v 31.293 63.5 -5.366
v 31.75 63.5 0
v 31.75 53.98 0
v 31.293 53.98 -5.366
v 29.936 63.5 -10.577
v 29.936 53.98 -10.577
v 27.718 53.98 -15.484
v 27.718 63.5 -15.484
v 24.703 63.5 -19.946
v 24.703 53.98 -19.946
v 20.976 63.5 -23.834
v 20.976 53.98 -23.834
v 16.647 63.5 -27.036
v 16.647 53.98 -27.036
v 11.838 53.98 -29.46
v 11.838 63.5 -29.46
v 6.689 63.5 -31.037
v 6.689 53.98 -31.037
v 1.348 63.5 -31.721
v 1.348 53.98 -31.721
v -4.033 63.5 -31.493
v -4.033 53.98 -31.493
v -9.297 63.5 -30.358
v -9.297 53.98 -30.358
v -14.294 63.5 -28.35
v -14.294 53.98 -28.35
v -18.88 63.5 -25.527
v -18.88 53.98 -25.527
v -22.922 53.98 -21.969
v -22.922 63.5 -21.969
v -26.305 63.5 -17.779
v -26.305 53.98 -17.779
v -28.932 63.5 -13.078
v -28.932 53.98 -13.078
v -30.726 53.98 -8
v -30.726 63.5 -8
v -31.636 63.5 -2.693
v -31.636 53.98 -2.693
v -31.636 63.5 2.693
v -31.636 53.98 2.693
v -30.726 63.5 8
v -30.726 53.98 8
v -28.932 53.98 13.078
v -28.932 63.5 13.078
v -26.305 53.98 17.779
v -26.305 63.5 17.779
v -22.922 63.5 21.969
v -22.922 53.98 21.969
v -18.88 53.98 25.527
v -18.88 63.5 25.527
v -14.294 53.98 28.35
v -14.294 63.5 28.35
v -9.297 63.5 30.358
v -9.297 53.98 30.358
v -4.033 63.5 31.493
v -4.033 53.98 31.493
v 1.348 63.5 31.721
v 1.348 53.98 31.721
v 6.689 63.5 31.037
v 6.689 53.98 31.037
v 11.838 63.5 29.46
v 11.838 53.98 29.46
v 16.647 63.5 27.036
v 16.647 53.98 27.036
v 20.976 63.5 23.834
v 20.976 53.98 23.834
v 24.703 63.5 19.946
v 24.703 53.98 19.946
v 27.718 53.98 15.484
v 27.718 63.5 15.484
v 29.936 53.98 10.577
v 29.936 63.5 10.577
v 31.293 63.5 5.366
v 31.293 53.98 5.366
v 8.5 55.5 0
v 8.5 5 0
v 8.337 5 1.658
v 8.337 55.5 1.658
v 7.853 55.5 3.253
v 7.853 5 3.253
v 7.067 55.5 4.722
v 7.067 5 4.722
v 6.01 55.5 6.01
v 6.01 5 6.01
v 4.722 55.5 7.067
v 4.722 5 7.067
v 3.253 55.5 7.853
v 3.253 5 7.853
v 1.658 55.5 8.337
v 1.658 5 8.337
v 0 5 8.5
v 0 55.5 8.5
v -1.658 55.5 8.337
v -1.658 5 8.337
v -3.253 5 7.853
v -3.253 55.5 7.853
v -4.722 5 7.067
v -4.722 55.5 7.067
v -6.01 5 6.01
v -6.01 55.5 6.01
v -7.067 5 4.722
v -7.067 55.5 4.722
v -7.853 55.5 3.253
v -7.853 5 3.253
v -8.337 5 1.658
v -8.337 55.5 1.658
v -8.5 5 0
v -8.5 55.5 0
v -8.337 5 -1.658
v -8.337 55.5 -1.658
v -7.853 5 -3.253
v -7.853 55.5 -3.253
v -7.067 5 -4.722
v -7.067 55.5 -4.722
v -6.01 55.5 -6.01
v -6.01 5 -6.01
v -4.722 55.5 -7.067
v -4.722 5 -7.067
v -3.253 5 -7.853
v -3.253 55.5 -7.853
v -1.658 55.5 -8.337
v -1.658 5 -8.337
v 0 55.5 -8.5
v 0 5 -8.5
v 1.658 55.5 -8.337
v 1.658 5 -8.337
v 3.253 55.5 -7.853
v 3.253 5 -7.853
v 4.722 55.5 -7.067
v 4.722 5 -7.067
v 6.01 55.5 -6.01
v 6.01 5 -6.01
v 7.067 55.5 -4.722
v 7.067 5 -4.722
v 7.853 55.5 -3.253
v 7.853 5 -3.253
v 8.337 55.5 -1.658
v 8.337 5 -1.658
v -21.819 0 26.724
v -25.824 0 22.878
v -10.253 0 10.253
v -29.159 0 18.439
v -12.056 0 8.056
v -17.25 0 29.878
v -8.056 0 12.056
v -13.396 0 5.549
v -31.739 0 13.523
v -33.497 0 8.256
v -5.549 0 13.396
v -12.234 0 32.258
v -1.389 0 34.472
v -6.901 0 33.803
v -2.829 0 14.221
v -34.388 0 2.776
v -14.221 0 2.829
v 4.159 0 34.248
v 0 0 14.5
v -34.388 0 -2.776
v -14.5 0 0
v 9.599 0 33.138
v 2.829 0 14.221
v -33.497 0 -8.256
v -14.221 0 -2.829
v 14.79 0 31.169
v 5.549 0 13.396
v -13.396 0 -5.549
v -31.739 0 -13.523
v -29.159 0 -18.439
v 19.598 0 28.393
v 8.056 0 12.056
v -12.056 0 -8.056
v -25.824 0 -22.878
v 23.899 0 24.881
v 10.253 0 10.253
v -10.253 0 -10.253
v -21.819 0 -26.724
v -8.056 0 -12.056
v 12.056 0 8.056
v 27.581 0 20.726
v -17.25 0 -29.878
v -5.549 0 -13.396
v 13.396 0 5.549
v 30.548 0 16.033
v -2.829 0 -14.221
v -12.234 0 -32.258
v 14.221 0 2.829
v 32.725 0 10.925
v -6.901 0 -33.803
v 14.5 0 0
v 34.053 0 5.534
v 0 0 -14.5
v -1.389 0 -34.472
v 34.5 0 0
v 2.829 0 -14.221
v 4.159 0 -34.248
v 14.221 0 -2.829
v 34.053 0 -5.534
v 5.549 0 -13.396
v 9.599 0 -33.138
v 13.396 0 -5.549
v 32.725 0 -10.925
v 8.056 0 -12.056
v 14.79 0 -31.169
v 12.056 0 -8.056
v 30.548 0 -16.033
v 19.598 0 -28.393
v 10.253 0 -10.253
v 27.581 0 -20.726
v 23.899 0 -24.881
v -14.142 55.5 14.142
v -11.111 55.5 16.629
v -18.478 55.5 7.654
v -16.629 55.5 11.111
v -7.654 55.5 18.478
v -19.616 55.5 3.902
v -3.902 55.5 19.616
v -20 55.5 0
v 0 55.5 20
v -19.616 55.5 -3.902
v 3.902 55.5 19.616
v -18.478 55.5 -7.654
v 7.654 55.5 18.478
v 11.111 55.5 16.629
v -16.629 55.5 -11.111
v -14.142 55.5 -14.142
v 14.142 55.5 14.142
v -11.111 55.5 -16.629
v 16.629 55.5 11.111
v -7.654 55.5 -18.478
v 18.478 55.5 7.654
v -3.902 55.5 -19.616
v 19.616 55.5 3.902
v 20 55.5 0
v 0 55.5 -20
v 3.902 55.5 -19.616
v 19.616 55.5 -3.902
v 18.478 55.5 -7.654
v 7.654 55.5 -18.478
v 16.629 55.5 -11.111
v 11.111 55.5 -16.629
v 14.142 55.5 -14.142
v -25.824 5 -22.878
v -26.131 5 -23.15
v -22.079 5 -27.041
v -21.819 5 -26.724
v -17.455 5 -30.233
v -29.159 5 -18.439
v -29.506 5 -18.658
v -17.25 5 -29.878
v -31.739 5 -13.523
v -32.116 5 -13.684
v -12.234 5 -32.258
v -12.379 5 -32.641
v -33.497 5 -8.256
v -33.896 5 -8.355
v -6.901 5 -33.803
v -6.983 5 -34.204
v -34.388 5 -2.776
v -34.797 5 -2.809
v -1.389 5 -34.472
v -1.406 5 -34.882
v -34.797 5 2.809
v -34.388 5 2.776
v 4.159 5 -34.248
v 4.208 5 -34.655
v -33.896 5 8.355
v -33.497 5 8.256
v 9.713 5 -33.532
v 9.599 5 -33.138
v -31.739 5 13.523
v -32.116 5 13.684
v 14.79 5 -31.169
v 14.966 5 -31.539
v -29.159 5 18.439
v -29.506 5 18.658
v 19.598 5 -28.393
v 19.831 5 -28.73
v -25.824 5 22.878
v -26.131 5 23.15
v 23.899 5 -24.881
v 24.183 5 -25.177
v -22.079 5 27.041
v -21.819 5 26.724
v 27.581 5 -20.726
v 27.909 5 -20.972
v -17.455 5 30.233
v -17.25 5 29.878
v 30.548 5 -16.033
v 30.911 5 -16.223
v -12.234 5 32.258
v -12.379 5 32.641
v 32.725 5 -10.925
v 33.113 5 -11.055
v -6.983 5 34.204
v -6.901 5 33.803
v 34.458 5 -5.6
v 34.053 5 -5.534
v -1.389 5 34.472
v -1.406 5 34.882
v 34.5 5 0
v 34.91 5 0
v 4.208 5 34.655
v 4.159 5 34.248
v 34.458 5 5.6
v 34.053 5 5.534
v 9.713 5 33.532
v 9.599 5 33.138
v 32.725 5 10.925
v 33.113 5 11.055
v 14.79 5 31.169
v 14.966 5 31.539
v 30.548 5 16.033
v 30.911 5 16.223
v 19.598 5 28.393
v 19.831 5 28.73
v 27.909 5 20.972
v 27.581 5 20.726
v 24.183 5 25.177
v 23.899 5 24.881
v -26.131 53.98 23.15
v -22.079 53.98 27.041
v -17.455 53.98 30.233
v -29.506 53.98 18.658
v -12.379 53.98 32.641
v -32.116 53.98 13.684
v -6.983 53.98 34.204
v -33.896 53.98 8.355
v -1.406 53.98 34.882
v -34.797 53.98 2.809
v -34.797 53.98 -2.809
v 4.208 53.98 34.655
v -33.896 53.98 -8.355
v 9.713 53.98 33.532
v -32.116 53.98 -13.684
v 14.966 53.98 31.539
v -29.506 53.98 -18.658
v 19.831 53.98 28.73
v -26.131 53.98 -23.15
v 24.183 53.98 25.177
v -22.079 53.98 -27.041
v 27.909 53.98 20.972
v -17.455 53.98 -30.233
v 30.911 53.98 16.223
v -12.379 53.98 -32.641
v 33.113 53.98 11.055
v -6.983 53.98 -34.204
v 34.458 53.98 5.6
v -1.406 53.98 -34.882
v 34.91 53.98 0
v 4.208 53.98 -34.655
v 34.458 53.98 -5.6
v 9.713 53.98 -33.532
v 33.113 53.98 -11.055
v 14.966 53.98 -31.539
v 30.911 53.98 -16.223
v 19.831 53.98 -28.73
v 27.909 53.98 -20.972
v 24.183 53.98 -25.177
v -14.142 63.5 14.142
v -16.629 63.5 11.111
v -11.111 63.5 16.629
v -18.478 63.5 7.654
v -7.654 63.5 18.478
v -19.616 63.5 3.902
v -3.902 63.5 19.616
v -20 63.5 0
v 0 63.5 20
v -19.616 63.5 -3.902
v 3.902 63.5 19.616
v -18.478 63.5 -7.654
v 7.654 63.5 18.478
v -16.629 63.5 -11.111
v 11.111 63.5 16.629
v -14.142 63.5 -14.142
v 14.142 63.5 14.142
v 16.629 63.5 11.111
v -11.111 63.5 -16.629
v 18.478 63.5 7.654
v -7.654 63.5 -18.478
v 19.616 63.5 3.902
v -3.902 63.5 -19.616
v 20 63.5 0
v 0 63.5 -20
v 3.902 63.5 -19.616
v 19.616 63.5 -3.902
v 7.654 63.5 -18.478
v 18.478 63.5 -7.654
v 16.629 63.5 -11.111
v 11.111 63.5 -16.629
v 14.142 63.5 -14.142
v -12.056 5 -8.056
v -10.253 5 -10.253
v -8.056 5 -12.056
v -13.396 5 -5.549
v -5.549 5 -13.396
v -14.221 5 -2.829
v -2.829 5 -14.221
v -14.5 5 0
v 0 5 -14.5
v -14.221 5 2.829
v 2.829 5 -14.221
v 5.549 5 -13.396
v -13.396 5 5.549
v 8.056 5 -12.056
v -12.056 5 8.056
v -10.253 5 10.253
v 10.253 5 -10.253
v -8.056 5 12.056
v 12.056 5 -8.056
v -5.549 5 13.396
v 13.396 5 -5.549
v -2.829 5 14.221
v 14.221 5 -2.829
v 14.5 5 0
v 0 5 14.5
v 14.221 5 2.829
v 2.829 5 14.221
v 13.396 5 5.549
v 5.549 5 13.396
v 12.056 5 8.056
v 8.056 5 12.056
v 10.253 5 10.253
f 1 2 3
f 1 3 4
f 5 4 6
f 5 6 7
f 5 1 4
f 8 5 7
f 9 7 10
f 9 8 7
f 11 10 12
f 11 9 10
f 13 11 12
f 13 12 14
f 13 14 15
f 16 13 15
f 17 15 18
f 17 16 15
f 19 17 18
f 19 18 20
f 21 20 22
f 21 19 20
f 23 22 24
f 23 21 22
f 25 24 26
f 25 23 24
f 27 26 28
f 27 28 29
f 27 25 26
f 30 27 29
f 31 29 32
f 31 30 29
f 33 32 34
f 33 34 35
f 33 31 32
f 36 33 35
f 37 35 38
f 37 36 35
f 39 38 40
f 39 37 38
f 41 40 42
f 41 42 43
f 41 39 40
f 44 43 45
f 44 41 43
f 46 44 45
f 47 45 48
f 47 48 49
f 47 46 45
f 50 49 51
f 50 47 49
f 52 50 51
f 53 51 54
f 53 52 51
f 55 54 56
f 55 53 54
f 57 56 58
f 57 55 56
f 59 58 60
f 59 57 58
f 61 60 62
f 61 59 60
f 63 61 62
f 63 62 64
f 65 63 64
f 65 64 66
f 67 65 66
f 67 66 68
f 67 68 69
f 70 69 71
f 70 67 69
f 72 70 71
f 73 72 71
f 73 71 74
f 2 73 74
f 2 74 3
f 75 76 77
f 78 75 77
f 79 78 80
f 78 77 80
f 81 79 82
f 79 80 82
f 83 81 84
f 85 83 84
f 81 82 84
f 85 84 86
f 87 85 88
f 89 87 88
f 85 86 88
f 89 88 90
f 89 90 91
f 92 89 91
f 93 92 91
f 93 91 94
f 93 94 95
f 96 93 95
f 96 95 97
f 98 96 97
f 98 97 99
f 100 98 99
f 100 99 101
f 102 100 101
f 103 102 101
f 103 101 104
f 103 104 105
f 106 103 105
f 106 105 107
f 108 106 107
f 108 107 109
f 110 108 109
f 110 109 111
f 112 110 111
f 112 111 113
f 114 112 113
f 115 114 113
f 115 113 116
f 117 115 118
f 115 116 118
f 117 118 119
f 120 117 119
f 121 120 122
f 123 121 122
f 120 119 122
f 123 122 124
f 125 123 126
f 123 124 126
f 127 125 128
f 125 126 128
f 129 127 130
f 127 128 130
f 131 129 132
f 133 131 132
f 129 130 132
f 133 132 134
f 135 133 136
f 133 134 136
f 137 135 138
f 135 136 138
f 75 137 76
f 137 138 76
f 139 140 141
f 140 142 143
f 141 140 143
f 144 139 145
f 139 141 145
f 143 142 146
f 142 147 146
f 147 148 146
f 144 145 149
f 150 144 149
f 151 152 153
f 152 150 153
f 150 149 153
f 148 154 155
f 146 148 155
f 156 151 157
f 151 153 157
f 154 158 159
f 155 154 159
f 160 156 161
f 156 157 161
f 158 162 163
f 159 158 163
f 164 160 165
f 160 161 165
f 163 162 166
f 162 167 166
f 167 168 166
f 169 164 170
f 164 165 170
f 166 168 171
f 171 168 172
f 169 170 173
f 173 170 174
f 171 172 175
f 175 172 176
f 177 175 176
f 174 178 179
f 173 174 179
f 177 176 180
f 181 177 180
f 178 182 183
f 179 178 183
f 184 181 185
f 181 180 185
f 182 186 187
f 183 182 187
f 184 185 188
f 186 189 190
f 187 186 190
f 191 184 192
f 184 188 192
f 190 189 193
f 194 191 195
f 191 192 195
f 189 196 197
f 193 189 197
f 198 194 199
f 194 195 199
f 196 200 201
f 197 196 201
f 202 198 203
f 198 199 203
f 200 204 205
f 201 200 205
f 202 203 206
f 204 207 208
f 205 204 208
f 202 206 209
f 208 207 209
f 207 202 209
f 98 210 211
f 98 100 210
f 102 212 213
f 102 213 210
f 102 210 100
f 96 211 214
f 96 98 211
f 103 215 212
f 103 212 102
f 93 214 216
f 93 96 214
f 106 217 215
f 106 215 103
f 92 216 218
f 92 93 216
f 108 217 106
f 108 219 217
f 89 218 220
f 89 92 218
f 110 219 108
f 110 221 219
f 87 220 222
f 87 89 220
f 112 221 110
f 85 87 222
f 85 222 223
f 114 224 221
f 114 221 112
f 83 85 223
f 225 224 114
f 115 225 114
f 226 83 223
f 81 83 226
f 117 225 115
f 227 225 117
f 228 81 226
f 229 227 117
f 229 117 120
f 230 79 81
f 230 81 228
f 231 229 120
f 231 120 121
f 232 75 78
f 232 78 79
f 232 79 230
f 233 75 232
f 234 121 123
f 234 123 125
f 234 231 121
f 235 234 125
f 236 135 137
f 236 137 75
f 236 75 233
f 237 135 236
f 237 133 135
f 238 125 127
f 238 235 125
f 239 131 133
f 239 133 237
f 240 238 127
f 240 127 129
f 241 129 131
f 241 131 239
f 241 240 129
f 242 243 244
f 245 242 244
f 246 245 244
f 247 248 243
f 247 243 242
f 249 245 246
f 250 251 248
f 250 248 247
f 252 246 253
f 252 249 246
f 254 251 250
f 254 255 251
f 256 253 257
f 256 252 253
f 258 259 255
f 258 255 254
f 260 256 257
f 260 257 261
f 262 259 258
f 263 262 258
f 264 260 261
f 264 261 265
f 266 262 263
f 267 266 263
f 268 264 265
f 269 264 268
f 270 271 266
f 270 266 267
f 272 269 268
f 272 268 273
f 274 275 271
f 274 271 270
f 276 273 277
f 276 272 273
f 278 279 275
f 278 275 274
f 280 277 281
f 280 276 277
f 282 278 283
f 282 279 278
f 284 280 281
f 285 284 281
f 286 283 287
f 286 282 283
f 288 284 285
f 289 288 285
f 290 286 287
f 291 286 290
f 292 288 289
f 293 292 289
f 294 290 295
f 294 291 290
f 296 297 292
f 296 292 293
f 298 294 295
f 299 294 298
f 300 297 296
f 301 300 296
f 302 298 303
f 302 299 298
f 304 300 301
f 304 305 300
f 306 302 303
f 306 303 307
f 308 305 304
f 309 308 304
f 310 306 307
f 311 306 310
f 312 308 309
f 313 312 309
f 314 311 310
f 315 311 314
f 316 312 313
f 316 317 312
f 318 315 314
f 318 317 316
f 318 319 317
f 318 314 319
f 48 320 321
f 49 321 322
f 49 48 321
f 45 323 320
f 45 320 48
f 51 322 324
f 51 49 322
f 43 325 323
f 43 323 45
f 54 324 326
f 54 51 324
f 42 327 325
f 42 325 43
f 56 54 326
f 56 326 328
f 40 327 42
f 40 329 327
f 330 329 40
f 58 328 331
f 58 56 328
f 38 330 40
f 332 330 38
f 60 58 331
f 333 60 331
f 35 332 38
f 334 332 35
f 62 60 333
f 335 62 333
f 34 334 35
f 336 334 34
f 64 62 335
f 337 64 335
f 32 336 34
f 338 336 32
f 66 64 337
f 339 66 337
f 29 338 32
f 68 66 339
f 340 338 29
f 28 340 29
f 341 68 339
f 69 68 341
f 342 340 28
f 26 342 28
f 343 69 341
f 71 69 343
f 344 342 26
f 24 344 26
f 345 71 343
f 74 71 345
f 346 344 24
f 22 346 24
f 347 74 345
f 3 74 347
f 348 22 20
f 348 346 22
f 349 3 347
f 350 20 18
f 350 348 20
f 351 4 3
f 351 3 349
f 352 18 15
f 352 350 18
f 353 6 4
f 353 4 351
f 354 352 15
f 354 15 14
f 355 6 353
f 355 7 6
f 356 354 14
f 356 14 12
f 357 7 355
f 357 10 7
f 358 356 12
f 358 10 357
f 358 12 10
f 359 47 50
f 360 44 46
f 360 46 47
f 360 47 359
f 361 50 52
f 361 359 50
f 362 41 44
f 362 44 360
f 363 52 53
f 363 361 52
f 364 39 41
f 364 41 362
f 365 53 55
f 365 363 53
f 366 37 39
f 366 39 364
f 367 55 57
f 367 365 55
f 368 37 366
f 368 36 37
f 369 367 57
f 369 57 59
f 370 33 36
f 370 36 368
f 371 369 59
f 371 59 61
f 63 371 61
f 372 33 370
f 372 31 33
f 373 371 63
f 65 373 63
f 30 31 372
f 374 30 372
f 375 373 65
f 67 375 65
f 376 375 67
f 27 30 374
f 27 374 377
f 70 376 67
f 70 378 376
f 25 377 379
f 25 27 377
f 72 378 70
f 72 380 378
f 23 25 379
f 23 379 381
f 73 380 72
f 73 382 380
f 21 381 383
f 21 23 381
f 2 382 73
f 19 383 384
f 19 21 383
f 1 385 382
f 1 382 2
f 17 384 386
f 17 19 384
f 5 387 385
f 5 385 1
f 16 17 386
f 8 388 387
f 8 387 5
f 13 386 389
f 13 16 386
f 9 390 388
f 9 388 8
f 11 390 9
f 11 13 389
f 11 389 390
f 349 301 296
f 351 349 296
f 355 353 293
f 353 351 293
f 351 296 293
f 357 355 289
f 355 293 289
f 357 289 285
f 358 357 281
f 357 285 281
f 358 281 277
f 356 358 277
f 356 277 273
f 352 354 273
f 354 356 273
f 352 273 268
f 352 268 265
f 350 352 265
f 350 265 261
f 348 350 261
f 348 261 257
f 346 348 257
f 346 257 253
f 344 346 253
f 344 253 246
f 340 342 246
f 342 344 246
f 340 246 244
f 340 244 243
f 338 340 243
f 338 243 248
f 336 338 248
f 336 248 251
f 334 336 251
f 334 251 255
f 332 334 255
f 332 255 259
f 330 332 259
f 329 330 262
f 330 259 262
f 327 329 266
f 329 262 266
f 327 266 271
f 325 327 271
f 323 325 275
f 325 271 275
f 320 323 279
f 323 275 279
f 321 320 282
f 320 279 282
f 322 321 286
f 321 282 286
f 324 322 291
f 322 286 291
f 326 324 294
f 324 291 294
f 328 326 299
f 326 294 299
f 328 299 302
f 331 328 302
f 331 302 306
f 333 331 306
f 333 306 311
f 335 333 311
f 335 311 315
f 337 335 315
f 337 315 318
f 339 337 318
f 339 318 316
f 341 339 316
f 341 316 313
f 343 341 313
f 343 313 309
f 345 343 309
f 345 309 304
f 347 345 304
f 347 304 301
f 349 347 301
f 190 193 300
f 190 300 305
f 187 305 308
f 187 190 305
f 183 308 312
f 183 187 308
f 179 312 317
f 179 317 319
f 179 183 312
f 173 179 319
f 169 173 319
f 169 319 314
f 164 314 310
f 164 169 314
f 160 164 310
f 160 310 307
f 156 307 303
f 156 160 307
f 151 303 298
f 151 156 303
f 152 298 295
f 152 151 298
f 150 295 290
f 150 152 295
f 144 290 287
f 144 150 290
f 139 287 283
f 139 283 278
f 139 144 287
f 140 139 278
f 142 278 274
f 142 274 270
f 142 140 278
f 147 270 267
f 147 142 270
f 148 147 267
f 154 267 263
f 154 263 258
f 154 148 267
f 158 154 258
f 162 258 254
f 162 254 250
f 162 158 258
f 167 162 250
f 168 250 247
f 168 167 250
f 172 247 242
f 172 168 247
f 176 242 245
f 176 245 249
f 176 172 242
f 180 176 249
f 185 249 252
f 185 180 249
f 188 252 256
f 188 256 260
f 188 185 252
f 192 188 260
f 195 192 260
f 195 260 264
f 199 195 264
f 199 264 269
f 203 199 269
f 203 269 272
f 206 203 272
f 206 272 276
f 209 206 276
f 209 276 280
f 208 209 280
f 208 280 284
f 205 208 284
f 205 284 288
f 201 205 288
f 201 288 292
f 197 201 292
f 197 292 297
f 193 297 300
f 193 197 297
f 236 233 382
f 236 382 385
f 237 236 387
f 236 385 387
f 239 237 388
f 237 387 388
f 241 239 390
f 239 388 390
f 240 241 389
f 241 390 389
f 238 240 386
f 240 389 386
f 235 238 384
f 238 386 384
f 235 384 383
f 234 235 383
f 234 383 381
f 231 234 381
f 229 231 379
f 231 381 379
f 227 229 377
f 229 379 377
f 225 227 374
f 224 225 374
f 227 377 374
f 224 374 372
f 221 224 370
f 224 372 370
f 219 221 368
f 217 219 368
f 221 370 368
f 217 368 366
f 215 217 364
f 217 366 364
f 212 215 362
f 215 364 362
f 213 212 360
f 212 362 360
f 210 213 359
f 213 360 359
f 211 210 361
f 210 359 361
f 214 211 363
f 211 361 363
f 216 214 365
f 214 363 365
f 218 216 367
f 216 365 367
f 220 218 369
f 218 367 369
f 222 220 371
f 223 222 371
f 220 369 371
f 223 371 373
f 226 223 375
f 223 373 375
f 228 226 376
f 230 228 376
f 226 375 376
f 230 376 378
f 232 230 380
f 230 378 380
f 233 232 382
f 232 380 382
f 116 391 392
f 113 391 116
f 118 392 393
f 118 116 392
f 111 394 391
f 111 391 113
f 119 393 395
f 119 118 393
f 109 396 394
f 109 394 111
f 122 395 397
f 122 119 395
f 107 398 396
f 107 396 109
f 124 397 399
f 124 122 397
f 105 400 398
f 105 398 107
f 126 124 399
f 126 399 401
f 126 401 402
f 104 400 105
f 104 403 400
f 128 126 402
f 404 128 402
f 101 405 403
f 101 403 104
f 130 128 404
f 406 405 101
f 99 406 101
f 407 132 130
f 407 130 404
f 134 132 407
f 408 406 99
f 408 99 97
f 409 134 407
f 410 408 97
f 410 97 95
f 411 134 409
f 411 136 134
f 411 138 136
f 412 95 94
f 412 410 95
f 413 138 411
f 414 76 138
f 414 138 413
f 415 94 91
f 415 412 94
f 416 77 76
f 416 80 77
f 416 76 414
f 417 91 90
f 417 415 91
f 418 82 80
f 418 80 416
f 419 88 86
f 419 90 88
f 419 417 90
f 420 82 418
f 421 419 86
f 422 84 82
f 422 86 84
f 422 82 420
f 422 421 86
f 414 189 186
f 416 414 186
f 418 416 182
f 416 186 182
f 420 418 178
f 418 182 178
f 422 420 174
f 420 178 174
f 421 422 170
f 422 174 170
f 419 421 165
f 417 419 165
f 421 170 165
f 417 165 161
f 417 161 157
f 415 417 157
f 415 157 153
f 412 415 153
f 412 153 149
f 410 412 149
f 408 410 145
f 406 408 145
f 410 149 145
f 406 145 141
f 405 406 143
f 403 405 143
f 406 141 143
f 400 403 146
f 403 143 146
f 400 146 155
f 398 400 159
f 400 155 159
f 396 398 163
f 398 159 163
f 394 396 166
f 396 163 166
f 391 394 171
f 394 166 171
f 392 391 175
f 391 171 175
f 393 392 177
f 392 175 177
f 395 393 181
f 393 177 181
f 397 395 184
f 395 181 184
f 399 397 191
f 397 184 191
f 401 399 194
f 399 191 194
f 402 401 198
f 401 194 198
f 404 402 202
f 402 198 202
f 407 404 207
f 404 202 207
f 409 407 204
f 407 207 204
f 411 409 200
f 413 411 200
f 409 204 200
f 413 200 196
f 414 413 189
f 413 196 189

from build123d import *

# Parameters (mm, degrees)
SKETCH1_R           = 34.91
BOSS_EXTRUDE1_DEPTH = 63.5
SKETCH2_OUTSIDE_W   = 95.3
SKETCH2_OUTSIDE_H   = 95.3
SKETCH2_OUTSIDE_R   = 34.5
CUT_EXTRUDE1_DEPTH  = 5
SKETCH3_OUTSIDE_W   = 95.3
SKETCH3_OUTSIDE_H   = 95.3
SKETCH3_OUTSIDE_R   = 31.75
CUT_EXTRUDE2_DEPTH  = 9.52
SKETCH4_R           = 20
CUT_EXTRUDE3_DEPTH  = 8
SKETCH5_R           = 8.5
CUT_EXTRUDE4_DEPTH  = 64.5
SKETCH6_R           = 14.5
CUT_EXTRUDE5_DEPTH  = 5


with BuildPart() as part:
    # Sketch1 → Boss-Extrude1 (new body)
    with BuildSketch(Plane(origin=(0, 0, 0), x_dir=(1, 0, 0), z_dir=(0, 1, 0))):
        Circle(SKETCH1_R)
    extrude(amount=BOSS_EXTRUDE1_DEPTH)

    # Sketch2 outside → Cut-Extrude1 (cut)
    with BuildSketch(Plane.XZ):
        Rectangle(SKETCH2_OUTSIDE_W, SKETCH2_OUTSIDE_H)
        Circle(SKETCH2_OUTSIDE_R, mode=Mode.SUBTRACT)
    extrude(amount=-CUT_EXTRUDE1_DEPTH, mode=Mode.SUBTRACT)

    # Sketch3 outside → Cut-Extrude2 (cut)
    with BuildSketch(Plane(origin=(0, 63.5, 0), x_dir=(1, 0, 0), z_dir=(0, 1, 0))):
        Rectangle(SKETCH3_OUTSIDE_W, SKETCH3_OUTSIDE_H)
        Circle(SKETCH3_OUTSIDE_R, mode=Mode.SUBTRACT)
    extrude(amount=-CUT_EXTRUDE2_DEPTH, mode=Mode.SUBTRACT)

    # Sketch4 → Cut-Extrude3 (cut)
    with BuildSketch(Plane(origin=(0, 63.5, 0), x_dir=(1, 0, 0), z_dir=(0, 1, 0))):
        Circle(SKETCH4_R)
    extrude(amount=-CUT_EXTRUDE3_DEPTH, mode=Mode.SUBTRACT)

    # Sketch5 → Cut-Extrude4 (cut, through all)
    with BuildSketch(Plane.XZ):
        Circle(SKETCH5_R)
    extrude(amount=-CUT_EXTRUDE4_DEPTH, mode=Mode.SUBTRACT)

    # Sketch6 → Cut-Extrude5 (cut)
    with BuildSketch(Plane.XZ):
        Circle(SKETCH6_R)
    extrude(amount=-CUT_EXTRUDE5_DEPTH, mode=Mode.SUBTRACT)


solid = part.part
